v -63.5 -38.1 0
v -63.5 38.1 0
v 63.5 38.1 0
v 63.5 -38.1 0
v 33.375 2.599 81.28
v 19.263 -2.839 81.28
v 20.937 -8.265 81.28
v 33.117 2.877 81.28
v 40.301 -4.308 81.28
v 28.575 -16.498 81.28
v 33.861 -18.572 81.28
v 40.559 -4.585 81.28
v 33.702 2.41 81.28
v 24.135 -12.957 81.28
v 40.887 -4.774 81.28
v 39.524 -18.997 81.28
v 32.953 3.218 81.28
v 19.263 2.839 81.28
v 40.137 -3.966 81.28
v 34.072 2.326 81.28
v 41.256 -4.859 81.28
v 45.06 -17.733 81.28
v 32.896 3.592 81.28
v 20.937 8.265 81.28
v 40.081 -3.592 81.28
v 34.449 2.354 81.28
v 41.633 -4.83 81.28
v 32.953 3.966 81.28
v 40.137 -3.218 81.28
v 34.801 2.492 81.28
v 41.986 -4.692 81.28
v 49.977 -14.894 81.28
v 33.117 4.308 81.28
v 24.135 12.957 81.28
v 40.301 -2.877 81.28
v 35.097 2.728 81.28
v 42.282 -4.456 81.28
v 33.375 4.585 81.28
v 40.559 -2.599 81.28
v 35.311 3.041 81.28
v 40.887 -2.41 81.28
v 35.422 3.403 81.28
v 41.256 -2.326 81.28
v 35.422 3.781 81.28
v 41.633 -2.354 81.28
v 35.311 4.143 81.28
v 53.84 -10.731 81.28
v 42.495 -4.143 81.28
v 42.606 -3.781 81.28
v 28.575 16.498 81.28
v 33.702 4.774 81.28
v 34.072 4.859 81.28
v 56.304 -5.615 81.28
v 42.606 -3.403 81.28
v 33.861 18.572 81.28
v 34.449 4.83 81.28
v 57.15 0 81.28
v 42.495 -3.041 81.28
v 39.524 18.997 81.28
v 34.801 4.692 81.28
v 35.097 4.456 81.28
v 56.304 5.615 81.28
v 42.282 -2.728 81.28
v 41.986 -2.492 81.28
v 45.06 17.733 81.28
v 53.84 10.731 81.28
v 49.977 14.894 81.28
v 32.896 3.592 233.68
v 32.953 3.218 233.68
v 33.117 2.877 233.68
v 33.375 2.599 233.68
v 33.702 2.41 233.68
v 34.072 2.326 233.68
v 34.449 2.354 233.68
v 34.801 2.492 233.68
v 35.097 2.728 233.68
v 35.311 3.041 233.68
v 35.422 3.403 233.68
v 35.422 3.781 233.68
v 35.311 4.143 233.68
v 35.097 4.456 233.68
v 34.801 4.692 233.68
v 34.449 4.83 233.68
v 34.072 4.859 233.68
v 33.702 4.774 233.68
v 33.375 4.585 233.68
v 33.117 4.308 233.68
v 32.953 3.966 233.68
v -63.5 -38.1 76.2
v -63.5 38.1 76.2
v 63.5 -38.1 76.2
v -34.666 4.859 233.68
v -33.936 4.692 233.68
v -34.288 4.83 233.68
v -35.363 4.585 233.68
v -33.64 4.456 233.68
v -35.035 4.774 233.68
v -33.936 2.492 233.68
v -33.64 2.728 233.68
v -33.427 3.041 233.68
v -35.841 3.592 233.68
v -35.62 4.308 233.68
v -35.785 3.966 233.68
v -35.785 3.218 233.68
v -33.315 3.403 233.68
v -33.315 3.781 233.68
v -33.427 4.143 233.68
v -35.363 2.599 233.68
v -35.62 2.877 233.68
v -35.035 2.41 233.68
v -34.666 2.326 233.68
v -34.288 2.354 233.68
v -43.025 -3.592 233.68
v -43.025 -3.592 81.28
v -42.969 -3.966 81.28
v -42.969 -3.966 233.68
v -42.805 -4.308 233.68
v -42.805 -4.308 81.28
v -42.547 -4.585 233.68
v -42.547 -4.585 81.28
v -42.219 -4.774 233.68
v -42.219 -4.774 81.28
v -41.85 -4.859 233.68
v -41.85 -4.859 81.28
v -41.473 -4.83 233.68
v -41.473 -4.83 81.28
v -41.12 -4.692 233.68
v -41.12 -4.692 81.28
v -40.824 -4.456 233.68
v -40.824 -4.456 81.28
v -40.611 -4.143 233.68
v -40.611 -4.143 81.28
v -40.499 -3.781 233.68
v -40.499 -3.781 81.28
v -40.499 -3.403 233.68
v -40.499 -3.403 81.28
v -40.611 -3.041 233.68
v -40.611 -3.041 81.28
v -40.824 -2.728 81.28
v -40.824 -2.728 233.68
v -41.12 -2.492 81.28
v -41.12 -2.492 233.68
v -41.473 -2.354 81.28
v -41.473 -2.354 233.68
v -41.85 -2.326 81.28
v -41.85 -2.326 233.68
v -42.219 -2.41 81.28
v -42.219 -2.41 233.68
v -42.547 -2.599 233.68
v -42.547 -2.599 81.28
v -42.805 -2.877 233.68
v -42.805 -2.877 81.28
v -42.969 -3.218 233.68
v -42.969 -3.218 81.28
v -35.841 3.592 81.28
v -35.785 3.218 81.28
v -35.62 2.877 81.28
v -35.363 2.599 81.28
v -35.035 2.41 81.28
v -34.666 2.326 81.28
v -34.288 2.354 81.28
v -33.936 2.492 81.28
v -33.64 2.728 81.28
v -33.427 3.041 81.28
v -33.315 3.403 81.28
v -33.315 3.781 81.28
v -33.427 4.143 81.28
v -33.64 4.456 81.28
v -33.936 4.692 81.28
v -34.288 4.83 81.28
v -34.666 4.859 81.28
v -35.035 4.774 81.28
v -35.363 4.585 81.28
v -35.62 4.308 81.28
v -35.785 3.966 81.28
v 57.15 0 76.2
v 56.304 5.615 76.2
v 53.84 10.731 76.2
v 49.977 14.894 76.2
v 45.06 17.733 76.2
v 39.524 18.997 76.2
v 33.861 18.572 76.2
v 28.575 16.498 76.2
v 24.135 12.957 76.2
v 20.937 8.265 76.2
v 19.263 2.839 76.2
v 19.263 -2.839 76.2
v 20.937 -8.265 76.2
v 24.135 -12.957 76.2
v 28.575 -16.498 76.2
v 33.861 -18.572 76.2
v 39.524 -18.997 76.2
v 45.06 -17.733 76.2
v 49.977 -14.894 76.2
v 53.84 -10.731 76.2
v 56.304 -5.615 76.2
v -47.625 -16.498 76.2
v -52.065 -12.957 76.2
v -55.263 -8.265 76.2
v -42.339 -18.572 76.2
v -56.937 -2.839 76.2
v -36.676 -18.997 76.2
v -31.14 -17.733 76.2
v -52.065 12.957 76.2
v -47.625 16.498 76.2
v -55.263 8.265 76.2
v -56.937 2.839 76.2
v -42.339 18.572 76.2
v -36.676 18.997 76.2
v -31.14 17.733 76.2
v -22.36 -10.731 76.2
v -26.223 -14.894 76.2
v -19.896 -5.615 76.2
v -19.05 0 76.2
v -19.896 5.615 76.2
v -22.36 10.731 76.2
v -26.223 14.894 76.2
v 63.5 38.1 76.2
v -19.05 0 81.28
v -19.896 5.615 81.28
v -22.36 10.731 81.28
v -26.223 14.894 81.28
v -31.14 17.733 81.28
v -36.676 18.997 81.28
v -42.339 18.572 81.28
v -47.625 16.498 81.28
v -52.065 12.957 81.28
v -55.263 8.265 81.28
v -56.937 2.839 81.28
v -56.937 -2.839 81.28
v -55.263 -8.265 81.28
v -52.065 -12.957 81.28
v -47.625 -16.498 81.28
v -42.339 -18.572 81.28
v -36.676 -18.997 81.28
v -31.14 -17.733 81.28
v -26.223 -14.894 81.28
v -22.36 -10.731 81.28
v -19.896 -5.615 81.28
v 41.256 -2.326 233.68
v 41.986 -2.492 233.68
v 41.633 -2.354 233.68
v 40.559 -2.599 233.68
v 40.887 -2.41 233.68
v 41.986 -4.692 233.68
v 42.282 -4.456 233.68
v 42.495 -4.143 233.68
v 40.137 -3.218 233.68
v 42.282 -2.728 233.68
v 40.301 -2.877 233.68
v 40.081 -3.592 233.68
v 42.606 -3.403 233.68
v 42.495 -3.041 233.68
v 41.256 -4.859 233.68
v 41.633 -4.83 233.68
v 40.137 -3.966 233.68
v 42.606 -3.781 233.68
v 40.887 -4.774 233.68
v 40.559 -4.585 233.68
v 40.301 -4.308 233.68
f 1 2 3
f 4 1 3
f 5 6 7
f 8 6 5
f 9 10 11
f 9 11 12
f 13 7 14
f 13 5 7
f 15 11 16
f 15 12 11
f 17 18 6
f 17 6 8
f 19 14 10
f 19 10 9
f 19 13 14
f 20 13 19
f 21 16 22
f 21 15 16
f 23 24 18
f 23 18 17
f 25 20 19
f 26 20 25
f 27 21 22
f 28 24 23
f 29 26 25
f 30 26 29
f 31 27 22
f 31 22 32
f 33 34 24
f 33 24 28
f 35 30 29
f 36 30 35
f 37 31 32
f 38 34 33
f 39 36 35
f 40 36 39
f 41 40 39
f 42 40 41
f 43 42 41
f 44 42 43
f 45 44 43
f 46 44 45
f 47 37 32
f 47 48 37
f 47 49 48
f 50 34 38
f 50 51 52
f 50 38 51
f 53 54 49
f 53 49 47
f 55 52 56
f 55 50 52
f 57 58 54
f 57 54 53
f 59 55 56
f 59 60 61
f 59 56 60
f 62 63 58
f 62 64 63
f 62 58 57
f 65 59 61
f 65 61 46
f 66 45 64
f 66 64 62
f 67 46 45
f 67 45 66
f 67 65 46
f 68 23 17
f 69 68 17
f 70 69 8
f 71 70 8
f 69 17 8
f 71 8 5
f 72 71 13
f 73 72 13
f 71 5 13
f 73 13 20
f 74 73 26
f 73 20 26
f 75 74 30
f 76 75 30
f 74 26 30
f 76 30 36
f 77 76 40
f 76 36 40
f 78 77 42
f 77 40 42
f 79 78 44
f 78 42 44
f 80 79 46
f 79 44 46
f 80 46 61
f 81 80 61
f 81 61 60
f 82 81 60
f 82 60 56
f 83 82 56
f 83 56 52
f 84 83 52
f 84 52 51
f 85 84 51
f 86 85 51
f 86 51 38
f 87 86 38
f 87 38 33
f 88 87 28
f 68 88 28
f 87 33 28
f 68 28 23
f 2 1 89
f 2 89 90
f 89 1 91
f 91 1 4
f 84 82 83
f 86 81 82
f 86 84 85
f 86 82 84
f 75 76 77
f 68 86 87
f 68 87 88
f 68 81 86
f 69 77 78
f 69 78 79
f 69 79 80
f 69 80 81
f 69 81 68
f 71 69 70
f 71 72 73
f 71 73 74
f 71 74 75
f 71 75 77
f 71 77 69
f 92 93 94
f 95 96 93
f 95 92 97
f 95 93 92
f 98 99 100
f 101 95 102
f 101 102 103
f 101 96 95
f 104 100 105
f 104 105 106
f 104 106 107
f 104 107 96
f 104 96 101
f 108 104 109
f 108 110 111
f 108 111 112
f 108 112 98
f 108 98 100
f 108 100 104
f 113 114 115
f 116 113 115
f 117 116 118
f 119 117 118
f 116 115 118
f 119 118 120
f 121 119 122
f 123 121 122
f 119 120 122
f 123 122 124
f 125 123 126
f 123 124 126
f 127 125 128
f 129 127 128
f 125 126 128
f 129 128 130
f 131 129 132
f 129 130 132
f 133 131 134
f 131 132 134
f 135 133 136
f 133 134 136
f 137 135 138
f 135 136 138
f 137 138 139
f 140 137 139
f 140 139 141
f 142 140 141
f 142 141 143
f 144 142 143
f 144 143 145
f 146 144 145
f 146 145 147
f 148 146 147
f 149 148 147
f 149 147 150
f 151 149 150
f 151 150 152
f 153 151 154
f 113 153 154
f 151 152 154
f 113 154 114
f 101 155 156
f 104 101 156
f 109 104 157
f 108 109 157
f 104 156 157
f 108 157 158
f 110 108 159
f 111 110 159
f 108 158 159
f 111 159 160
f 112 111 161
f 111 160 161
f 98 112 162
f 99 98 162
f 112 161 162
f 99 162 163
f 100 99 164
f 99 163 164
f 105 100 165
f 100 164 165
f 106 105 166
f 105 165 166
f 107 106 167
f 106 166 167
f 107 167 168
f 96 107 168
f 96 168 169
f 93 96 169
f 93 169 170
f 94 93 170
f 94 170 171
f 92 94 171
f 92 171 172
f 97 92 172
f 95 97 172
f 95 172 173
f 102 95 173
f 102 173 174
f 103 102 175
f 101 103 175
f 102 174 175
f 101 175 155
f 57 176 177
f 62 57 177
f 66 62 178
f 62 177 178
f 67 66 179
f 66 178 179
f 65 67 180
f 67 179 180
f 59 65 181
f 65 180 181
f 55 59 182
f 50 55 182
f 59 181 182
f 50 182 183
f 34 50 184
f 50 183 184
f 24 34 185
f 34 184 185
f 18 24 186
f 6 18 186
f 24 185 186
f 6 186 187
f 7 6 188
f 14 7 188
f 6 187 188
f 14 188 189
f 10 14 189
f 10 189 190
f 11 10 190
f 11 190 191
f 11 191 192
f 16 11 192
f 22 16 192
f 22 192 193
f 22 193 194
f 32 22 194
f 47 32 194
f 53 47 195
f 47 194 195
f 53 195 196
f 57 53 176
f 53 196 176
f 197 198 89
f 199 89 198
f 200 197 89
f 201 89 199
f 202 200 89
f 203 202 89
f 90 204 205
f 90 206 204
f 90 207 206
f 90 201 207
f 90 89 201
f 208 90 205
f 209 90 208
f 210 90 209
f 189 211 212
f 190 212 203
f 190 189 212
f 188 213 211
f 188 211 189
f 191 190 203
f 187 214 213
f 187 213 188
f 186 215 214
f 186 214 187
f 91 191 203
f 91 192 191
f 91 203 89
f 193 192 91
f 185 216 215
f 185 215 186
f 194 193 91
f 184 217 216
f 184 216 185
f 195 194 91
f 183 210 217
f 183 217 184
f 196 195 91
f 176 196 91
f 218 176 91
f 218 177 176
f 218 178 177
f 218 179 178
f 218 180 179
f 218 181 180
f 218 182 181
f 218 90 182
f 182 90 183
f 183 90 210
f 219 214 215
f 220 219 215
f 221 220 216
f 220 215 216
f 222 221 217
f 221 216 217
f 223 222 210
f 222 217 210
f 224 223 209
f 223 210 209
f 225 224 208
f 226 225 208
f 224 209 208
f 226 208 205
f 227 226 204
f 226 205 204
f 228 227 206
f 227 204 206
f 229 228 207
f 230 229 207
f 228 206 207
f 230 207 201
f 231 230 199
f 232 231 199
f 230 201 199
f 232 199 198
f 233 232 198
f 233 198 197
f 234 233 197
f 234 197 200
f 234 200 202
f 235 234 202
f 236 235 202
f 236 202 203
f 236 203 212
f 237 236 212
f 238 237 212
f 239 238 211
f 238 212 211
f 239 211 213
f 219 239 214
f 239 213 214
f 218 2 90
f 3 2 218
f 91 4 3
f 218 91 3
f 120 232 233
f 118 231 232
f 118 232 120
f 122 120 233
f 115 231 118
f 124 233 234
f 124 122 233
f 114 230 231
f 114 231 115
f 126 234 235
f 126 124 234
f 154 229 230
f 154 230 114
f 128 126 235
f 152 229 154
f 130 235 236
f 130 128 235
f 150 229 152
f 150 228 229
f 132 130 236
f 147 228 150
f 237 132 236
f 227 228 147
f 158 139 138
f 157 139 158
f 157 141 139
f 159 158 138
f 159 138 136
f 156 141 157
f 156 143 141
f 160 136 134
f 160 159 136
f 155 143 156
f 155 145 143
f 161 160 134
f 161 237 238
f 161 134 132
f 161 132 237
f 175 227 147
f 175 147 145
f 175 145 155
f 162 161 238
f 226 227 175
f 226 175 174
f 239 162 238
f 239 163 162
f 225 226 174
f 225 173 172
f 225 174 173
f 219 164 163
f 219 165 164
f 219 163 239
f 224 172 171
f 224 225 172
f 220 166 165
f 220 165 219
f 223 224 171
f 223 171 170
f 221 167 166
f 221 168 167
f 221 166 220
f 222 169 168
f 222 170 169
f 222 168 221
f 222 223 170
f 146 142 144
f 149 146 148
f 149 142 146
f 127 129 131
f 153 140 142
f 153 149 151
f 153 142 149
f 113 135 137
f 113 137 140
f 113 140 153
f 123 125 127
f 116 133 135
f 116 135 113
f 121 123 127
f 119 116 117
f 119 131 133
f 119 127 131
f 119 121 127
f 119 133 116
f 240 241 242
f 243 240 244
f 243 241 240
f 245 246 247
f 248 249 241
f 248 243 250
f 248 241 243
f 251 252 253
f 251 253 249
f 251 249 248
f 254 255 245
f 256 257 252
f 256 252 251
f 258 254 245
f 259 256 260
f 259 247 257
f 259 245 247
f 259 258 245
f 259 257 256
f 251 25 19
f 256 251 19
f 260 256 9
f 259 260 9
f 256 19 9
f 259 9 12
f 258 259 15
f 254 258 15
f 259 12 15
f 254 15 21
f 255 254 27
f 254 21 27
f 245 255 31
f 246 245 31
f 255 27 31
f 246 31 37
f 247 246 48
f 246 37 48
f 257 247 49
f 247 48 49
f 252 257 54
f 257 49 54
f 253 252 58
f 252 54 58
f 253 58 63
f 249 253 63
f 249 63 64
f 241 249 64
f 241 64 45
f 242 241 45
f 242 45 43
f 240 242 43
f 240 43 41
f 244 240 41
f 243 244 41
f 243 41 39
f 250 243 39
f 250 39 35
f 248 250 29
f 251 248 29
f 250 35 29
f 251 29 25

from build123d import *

# Parameters (mm, degrees)
SKETCH1_W           = 127
SKETCH1_H           = 76.2
BOSS_EXTRUDE1_DEPTH = 76.2
SKETCH2_R           = 19.05
BOSS_EXTRUDE2_DEPTH = 5.08
SKETCH3_R           = 1.27
BOSS_EXTRUDE3_DEPTH = 152.4


with BuildPart() as part:
    # Sketch1 → Boss-Extrude1 (new body)
    with BuildSketch(Plane.XY):
        Rectangle(SKETCH1_W, SKETCH1_H)
    extrude(amount=BOSS_EXTRUDE1_DEPTH)

    # Sketch2 → Boss-Extrude2 (add)
    with BuildSketch(Plane.XY.offset(76.2)):
        with Locations((38.1, 0)):
            Circle(SKETCH2_R)
        with Locations((-38.1, 0)):
            Circle(SKETCH2_R)
    extrude(amount=BOSS_EXTRUDE2_DEPTH)

    # Sketch3 → Boss-Extrude3 (add)
    with BuildSketch(Plane.XY.offset(81.28)):
        with Locations(Location((41.35063463, -3.592102448, 0), (0, 0, 180))):
            Circle(SKETCH3_R)
        with Locations(Location((34.166429733, 3.592102448, 0), (0, 0, 180))):
            Circle(SKETCH3_R)
        with Locations(Location((-41.755190332, -3.592102448, 0), (0, 0, 180))):
            Circle(SKETCH3_R)
        with Locations(Location((-34.570985435, 3.592102448, 0), (0, 0, 180))):
            Circle(SKETCH3_R)
    extrude(amount=BOSS_EXTRUDE3_DEPTH)


solid = part.part
